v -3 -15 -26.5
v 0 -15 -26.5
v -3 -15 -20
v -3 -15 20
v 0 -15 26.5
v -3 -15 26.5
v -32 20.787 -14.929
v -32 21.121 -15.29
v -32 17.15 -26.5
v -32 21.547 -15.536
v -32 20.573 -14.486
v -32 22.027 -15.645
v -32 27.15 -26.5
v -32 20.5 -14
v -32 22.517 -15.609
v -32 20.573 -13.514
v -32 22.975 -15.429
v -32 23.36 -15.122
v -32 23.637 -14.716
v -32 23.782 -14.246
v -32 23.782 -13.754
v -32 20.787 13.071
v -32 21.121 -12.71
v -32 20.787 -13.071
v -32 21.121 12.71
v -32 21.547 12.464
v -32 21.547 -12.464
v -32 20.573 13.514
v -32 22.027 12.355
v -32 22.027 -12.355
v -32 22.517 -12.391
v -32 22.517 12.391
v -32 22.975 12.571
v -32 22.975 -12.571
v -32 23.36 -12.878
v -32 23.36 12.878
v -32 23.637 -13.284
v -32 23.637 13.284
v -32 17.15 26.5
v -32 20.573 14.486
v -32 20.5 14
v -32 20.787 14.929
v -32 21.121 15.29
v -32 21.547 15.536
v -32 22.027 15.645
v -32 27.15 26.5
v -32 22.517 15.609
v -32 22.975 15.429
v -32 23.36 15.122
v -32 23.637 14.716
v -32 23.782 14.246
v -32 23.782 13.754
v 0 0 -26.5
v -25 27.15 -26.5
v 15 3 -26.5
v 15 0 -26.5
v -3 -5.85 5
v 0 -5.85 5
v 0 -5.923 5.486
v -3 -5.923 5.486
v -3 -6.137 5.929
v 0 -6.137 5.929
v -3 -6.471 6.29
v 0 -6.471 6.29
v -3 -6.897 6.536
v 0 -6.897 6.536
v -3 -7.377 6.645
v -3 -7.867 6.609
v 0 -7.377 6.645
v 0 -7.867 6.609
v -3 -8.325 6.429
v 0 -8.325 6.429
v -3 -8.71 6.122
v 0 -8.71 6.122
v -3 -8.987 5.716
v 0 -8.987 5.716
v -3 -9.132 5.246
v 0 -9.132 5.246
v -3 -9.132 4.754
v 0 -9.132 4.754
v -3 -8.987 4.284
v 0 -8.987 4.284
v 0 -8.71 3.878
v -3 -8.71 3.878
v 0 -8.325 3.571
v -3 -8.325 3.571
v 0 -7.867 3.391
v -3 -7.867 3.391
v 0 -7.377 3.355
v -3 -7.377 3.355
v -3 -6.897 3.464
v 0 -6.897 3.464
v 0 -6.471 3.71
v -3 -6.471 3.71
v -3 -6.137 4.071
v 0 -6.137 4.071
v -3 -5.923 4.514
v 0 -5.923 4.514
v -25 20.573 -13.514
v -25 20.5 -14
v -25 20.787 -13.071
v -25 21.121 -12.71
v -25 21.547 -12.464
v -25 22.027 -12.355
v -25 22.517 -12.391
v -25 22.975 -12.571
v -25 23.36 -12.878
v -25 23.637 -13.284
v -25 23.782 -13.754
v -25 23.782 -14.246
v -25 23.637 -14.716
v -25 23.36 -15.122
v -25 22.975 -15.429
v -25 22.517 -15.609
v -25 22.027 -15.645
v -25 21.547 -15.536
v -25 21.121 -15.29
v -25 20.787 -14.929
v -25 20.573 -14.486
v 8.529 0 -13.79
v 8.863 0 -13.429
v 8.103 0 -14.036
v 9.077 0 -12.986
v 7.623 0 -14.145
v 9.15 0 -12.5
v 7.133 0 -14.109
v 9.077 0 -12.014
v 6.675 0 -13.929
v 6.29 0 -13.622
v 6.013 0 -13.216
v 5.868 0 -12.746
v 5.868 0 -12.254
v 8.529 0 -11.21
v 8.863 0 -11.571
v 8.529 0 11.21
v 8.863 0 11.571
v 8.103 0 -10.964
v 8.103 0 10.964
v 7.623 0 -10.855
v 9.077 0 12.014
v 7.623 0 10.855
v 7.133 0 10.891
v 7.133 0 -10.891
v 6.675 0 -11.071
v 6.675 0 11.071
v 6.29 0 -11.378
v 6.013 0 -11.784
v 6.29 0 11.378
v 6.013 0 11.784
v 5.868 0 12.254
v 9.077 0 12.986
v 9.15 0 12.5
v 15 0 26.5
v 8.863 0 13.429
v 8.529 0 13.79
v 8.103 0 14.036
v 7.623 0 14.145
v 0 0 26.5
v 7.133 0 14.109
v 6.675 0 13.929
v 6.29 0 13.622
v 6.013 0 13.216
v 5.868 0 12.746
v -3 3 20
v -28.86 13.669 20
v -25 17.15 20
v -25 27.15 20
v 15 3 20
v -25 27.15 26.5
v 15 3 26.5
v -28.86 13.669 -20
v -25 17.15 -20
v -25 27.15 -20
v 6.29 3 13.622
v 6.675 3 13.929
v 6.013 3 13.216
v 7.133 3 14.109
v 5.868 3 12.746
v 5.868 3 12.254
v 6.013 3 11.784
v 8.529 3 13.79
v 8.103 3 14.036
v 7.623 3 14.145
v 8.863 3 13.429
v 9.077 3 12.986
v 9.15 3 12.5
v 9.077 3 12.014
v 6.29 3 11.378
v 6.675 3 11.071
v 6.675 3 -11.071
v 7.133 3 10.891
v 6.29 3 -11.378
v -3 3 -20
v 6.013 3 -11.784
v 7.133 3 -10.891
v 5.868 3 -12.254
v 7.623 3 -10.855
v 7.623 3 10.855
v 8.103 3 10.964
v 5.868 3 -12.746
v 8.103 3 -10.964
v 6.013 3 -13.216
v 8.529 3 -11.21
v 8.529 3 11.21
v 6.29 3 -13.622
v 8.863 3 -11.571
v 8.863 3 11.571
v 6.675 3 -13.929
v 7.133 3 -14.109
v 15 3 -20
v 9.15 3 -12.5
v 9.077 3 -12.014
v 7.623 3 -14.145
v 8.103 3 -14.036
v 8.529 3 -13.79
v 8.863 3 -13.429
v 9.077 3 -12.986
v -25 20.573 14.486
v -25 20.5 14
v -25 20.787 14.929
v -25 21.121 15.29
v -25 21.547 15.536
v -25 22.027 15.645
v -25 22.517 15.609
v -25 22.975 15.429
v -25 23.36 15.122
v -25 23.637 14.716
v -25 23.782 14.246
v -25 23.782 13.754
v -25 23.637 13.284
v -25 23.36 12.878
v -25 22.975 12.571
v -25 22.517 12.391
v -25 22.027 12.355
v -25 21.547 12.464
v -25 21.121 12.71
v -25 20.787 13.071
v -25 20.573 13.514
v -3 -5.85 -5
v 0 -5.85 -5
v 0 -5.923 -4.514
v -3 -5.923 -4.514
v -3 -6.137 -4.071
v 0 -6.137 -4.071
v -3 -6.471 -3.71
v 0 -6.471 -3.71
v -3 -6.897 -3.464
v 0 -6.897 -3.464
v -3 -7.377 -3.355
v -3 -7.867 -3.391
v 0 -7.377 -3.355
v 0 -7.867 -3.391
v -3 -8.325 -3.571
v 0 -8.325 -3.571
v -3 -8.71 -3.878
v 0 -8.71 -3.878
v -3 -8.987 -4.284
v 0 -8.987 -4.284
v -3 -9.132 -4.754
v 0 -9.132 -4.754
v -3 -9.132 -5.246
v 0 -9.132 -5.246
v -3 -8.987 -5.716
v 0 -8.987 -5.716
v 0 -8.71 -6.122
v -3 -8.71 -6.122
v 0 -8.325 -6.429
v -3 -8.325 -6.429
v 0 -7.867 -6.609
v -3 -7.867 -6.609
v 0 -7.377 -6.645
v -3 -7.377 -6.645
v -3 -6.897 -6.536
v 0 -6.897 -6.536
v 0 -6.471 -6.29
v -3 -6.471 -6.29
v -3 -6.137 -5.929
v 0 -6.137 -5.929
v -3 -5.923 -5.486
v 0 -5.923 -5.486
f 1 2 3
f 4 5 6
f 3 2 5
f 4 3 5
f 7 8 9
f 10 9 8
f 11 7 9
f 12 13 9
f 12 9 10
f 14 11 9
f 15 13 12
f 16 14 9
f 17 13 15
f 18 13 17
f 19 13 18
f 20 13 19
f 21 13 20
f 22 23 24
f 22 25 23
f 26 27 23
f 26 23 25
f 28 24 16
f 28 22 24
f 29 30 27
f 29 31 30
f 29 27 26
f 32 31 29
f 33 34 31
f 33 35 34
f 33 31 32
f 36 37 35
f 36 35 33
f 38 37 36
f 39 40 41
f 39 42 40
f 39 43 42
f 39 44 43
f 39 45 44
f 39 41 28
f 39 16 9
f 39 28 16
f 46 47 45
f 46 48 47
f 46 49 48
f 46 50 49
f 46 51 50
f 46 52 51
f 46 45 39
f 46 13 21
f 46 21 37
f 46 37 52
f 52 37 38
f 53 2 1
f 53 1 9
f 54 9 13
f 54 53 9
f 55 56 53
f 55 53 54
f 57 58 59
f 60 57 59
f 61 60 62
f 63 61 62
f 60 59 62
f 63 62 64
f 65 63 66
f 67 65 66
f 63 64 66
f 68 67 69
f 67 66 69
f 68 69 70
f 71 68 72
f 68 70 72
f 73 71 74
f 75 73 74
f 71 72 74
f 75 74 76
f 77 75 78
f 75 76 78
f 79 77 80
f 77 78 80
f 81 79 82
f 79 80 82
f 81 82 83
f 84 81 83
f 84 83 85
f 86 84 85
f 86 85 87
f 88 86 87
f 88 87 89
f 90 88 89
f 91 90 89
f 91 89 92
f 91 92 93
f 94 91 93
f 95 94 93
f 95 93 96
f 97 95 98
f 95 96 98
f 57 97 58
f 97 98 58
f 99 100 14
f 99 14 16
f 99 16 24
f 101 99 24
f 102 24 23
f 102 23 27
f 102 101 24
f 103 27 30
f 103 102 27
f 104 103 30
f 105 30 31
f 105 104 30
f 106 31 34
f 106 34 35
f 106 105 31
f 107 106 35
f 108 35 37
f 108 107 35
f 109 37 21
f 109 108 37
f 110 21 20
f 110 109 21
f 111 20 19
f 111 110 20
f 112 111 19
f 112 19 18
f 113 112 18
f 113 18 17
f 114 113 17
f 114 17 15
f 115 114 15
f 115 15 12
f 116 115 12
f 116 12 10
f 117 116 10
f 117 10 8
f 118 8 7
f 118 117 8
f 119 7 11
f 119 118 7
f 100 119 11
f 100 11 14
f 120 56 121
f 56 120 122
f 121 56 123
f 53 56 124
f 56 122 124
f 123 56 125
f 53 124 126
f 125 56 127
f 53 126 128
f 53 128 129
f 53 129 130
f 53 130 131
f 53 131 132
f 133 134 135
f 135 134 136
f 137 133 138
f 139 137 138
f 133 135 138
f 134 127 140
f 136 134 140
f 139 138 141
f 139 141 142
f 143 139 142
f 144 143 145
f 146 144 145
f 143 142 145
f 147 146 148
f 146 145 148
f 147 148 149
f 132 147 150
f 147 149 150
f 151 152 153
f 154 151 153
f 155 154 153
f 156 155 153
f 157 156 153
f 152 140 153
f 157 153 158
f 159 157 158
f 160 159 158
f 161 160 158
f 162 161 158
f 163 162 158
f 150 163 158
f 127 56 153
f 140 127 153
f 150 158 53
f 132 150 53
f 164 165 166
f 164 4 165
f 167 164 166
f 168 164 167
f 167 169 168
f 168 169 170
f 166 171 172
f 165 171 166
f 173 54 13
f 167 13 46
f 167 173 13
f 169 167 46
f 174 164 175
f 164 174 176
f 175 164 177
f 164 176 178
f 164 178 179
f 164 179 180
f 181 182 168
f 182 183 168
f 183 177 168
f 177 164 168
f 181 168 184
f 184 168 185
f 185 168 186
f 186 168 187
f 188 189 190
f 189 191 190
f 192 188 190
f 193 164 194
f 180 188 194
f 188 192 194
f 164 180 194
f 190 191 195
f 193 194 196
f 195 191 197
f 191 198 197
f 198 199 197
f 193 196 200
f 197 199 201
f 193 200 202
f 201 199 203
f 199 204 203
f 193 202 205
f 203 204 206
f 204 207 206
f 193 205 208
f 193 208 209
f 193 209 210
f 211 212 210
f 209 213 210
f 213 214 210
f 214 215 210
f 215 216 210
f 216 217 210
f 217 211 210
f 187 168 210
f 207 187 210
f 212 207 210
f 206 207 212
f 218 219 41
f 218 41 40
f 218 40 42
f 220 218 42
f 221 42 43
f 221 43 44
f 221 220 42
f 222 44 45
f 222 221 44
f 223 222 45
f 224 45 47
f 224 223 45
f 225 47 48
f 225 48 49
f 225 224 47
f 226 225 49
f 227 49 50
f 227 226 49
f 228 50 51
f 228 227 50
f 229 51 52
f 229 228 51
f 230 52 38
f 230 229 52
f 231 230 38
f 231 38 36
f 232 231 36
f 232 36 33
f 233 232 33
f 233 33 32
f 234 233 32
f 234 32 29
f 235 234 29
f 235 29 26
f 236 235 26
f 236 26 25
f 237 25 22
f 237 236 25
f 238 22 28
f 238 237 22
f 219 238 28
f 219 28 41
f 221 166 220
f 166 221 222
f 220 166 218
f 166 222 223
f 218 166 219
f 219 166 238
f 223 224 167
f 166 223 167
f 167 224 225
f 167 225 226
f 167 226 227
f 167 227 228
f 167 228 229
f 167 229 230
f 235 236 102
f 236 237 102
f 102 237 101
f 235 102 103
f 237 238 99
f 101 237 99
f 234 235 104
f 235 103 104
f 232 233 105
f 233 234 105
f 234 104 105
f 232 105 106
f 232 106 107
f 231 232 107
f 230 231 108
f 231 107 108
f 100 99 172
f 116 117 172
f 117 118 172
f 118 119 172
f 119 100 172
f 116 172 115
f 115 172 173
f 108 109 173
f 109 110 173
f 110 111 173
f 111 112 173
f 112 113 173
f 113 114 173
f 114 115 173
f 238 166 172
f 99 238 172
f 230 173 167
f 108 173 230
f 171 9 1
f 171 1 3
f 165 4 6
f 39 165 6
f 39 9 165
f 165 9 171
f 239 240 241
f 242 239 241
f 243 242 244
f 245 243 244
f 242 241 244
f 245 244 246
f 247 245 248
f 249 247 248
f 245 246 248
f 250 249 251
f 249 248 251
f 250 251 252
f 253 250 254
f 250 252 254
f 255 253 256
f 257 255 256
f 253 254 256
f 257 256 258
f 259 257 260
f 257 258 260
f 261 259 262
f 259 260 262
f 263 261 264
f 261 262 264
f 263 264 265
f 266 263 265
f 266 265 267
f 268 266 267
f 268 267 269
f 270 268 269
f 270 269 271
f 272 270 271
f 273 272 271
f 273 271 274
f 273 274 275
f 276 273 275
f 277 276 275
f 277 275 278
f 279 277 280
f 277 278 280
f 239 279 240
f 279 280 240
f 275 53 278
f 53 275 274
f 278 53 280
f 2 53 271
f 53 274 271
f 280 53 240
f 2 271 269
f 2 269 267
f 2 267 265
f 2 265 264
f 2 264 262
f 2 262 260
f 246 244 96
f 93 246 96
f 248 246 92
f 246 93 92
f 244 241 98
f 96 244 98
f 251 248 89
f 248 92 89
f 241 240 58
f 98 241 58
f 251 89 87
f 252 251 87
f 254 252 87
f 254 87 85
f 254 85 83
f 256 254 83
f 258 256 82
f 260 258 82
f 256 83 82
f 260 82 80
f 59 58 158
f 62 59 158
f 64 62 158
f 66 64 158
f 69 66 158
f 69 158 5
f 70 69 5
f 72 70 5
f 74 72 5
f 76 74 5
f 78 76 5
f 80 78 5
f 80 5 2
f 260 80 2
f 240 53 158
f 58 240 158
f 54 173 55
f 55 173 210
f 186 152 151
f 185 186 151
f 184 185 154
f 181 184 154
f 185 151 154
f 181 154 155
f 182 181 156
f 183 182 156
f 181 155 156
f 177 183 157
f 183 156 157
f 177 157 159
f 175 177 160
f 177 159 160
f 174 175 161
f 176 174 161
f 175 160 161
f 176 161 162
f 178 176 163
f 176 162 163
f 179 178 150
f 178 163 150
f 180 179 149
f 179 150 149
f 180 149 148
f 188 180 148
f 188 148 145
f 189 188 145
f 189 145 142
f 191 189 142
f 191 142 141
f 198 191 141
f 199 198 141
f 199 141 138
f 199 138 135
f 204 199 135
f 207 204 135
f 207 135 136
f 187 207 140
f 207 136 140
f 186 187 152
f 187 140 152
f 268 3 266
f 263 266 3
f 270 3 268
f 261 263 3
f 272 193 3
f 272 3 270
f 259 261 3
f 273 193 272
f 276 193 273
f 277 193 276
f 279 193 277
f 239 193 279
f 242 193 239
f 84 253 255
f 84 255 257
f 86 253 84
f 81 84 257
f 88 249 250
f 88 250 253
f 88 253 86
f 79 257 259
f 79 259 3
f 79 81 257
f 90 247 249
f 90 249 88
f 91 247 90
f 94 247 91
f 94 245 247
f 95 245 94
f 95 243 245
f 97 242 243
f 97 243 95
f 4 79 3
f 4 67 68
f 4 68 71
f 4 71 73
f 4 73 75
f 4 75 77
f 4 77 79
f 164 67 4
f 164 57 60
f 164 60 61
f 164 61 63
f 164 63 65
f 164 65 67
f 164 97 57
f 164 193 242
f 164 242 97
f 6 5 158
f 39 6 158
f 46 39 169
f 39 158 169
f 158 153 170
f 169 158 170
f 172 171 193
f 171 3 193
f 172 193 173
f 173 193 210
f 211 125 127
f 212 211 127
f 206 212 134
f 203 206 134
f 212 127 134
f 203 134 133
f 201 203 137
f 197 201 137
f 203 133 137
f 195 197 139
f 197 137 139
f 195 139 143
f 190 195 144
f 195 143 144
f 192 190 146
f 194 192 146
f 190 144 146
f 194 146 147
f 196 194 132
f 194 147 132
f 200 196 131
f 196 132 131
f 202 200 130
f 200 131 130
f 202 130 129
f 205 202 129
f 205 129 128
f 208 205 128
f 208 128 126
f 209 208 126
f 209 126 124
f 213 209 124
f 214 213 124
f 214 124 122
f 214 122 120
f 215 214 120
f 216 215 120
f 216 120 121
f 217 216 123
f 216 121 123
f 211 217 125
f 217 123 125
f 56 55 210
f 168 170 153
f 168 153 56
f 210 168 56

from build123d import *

# Parameters (mm, degrees)
BOSS_EXTRUDE1_DEPTH = 26.5
SKETCH3_W           = 53
SKETCH3_H           = 10
SKETCH3_R           = 1.65
BOSS_EXTRUDE2_DEPTH = 7
CUT_EXTRUDE1_REACH  = 62.402
SKETCH4_W           = 40
SKETCH4_H           = 24.15
CUT_EXTRUDE2_START  = -32.15
SKETCH5_W           = 45
SKETCH5_H           = 40
CUT_EXTRUDE2_DEPTH  = 32.15
SKETCH7_R           = 1.65
CUT_EXTRUDE4_DEPTH  = 3
SKETCH8_R           = 1.65
CUT_EXTRUDE5_DEPTH  = 3
BOSS_EXTRUDE3_REACH = 52.348
SKETCH9_W           = 40
SKETCH9_H           = 4.688556191


with BuildPart() as part:
    # Sketch1 → Boss-Extrude1 (new, symmetric)
    with BuildSketch(Plane.XY):
        Polygon((15, 0), (0, 0), (0, -15), (-3, -15), (-32, 17.15), (-25, 17.15), (-25, 27.15), (15, 3), align=None)
    extrude(amount=BOSS_EXTRUDE1_DEPTH, both=True)

    # Sketch3 → Boss-Extrude2 (add)
    with BuildSketch(Plane.ZY.offset(25)):
        with Locations((0, 22.15)):
            Rectangle(SKETCH3_W, SKETCH3_H)
        with Locations(Location((-14, 22.15, 0), (0, 0, 270))):
            Circle(SKETCH3_R, mode=Mode.SUBTRACT)
        with Locations(Location((14, 22.15, 0), (0, 0, 270))):
            Circle(SKETCH3_R, mode=Mode.SUBTRACT)
    extrude(amount=BOSS_EXTRUDE2_DEPTH)

    # Cut-Extrude1: up to this face of the body (flat: up to its plane)
    cut_extrude1_end = Plane(part.part.faces().sort_by_distance((-25, 22.15, -14))[0])
    # Sketch4 → Cut-Extrude1 (cut, up to the picked face)
    with BuildSketch(Plane(origin=(15, 0, 0), x_dir=(0, 0, -1), z_dir=(1, 0, 0)), mode=Mode.PRIVATE) as cut_extrude1_sk1:
        with Locations((0, 15.075)):
            Rectangle(SKETCH4_W, SKETCH4_H)
    cut_extrude1_tool1 = split(extrude(cut_extrude1_sk1.sketch, amount=-CUT_EXTRUDE1_REACH, mode=Mode.PRIVATE), bisect_by=cut_extrude1_end, keep=Keep.BOTH, mode=Mode.PRIVATE)
    add(cut_extrude1_tool1.solids().sort_by(Axis((15, 15.075, 0), (-1, 0, 0)))[0], mode=Mode.SUBTRACT)

    # Sketch5 → Cut-Extrude2 (cut)
    with BuildSketch(Plane.XZ.offset(15).offset(CUT_EXTRUDE2_START)):
        with Locations((-25.5, 0)):
            Rectangle(SKETCH5_W, SKETCH5_H)
    extrude(amount=CUT_EXTRUDE2_DEPTH, mode=Mode.SUBTRACT)

    # Sketch7 → Cut-Extrude4 (cut)
    with BuildSketch(Plane(origin=(0, 0, 0), x_dir=(0, 0, -1), z_dir=(1, 0, 0))):
        with Locations(Location((-5, -7.5, 0), (0, 0, 90))):
            Circle(SKETCH7_R)
        with Locations(Location((5, -7.5, 0), (0, 0, 90))):
            Circle(SKETCH7_R)
    extrude(amount=-CUT_EXTRUDE4_DEPTH, mode=Mode.SUBTRACT)

    # Sketch8 → Cut-Extrude5 (cut)
    with BuildSketch(Plane.XZ):
        with Locations((7.5, 12.5)):
            Circle(SKETCH8_R)
        with Locations((7.5, -12.5)):
            Circle(SKETCH8_R)
    extrude(amount=-CUT_EXTRUDE5_DEPTH, mode=Mode.SUBTRACT)

    # Boss-Extrude3: up to this face of the body (flat: up to its plane)
    boss_extrude3_end = Plane(part.part.faces().sort_by_distance((-28.5, 17.15, 0))[0])
    # Sketch9 → Boss-Extrude3 (add, up to the picked face)
    with BuildSketch(Plane(origin=(-9.114431039, -8.221415245, 0), x_dir=(0, 0, 1), z_dir=(-0.7425471996920773, -0.669793741557395, 0)), mode=Mode.PRIVATE) as boss_extrude3_sk1:
        with Locations((0, 31.82380611)):
            Rectangle(SKETCH9_W, SKETCH9_H)
    boss_extrude3_tool1 = split(extrude(boss_extrude3_sk1.sketch, amount=-BOSS_EXTRUDE3_REACH, mode=Mode.PRIVATE), bisect_by=boss_extrude3_end, keep=Keep.BOTH, mode=Mode.PRIVATE)
    add(boss_extrude3_tool1.solids().sort_by(Axis((-30.429817, 15.409263, 0), (0.7425471996920773, 0.669793741557395, 0)))[0])


solid = part.part
